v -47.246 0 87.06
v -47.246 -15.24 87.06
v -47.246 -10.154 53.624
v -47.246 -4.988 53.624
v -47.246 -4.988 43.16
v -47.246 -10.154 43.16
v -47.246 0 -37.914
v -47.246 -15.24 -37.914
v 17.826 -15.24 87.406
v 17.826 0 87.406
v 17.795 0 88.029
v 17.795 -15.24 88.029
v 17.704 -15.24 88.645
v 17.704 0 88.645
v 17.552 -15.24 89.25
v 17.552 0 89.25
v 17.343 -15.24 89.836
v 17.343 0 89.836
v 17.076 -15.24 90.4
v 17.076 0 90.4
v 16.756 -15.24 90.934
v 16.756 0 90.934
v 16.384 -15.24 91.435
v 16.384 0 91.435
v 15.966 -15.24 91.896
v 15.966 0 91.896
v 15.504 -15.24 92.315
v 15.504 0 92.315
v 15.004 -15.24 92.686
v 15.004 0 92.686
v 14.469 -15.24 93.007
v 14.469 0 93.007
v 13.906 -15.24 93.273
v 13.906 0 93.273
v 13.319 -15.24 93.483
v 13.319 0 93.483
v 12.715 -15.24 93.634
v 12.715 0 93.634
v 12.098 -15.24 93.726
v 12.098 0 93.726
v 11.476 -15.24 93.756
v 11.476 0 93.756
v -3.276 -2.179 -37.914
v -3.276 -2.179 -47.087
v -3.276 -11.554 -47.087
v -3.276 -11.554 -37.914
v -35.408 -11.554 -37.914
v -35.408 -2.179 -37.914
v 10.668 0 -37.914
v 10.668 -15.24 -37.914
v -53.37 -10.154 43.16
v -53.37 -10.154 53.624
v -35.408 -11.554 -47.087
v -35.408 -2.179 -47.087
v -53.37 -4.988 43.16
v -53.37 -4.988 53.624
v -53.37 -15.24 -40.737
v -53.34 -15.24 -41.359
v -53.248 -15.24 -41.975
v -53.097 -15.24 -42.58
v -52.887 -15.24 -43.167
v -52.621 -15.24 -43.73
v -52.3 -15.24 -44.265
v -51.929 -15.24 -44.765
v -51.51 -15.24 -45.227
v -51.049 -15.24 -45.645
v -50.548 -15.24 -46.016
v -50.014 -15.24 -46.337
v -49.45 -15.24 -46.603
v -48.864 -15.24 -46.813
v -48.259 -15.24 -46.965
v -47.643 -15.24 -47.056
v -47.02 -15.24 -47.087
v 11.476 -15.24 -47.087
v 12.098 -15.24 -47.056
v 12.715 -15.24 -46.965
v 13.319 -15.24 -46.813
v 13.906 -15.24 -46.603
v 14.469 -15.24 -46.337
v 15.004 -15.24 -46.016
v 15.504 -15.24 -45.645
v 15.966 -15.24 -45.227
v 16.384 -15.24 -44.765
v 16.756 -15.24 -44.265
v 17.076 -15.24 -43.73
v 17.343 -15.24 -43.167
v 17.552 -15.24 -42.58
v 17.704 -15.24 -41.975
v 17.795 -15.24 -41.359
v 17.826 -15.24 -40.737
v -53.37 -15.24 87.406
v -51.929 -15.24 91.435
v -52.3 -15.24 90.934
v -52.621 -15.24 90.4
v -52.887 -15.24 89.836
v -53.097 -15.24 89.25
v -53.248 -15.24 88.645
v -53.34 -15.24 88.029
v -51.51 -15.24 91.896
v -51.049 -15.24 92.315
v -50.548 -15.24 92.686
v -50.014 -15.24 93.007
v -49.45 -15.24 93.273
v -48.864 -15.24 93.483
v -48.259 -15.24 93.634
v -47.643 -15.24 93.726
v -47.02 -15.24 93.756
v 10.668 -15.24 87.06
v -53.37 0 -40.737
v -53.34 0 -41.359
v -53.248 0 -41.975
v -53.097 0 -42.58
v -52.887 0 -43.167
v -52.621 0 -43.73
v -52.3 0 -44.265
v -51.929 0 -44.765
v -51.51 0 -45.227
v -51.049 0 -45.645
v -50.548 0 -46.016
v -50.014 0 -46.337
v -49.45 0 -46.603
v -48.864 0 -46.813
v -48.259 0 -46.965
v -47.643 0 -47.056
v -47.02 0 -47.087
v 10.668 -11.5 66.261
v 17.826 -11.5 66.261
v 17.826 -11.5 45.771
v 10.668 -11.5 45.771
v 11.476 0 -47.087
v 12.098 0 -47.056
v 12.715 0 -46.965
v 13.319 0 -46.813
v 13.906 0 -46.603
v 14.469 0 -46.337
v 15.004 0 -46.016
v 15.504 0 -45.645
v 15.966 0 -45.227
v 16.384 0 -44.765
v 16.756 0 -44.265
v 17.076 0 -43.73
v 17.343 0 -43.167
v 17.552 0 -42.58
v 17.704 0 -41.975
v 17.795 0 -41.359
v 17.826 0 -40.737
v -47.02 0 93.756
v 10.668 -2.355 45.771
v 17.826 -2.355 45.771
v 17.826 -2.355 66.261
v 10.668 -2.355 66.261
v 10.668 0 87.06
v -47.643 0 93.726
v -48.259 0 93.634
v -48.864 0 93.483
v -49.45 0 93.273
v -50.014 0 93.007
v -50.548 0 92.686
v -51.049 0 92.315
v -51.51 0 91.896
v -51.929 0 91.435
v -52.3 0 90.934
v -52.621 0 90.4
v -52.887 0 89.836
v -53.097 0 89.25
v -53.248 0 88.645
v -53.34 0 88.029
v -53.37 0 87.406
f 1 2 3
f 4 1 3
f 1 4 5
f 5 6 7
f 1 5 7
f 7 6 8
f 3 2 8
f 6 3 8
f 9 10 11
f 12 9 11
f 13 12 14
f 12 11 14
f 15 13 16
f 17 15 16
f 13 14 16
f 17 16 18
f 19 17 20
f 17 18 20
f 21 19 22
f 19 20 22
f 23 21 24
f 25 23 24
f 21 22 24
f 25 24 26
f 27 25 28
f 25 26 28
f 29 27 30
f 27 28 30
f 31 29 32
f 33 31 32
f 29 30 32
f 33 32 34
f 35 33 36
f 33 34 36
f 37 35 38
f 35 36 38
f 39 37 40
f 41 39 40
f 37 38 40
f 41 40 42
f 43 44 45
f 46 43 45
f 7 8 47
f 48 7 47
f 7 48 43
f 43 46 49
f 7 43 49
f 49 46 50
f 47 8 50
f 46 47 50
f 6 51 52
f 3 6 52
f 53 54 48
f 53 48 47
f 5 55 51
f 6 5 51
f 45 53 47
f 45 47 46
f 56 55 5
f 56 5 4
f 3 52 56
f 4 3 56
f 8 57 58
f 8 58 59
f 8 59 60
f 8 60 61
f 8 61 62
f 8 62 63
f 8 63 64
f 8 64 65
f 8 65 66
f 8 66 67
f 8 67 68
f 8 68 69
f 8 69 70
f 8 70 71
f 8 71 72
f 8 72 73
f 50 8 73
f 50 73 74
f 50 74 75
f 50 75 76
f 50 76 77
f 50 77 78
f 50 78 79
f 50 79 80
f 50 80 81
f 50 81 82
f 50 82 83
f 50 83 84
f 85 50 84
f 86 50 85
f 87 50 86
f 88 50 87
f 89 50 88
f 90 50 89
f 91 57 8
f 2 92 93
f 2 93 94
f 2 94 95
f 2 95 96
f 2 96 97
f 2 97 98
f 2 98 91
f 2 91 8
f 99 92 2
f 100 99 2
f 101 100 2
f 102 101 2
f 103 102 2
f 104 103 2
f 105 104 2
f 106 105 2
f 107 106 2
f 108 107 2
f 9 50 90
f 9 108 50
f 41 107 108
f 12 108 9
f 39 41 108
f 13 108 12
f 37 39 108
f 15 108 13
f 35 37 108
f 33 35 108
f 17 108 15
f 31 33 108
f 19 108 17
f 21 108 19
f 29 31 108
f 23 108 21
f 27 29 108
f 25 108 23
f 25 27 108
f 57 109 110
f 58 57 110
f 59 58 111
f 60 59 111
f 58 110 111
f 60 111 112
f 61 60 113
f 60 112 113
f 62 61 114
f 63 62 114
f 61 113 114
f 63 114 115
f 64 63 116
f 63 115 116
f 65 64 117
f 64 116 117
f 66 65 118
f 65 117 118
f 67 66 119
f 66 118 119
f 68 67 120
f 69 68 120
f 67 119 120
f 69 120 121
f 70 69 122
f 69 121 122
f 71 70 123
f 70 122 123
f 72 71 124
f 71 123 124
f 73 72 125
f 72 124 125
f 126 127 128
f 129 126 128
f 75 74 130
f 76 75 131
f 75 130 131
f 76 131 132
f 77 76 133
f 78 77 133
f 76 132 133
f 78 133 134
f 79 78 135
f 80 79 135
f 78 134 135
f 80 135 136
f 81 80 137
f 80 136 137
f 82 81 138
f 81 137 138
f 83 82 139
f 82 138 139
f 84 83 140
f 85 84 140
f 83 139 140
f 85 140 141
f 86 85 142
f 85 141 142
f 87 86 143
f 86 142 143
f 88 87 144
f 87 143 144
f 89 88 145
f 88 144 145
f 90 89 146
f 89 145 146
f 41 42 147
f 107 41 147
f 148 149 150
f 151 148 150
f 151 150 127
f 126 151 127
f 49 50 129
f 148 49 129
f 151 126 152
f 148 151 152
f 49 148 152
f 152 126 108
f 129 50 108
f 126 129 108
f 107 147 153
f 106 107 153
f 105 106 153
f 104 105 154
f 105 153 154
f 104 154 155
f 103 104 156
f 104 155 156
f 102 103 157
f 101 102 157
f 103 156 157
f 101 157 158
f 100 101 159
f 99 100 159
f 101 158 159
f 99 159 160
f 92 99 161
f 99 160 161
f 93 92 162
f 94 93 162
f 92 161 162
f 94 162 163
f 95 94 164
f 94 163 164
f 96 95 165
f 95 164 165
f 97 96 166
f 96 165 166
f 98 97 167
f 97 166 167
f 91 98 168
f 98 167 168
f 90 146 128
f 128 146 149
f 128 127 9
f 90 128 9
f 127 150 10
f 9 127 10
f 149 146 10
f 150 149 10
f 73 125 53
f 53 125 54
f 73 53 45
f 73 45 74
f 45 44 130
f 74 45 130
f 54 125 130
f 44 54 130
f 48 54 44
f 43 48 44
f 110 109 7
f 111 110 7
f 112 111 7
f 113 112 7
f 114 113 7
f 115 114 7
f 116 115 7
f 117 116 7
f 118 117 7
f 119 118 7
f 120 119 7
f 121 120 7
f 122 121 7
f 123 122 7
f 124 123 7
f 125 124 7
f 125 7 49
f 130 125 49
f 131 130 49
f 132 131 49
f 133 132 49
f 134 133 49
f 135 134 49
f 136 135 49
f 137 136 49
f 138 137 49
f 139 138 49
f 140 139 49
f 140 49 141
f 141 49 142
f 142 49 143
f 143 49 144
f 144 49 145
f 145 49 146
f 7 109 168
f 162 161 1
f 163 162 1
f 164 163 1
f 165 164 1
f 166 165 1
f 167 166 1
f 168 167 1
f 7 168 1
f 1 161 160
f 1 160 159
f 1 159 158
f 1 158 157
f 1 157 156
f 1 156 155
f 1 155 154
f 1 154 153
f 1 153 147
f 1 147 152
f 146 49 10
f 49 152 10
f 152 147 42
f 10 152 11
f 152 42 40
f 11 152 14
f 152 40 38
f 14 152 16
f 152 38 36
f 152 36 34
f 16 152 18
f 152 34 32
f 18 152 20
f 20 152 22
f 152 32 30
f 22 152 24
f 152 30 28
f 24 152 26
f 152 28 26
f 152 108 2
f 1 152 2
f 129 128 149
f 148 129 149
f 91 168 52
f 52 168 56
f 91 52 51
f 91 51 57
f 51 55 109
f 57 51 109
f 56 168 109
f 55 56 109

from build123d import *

# Parameters (mm, degrees)
F1_DEPTH  = 15.24
F4_DEPTH  = 25.4
F5_W      = 2.5342174816
F5_H      = 10.4648
F5_W_2    = 2.6317641129
F6_DEPTH  = 25.4
F8_DEPTH  = 25.4
F9_W      = 32.1324085817
F9_H      = 9.3754695263
F10_DEPTH = 25.4


with BuildPart() as f1:
    # F0 (on Front) → F1 (new body)
    with BuildSketch(Plane.XZ):
        with BuildLine():
            ThreePointArc((-47.0203304827, 93.7563699834), (-51.5104585433, 91.896498044), (-53.3703304827, 87.4063699834))
            Line((-53.3703304827, 87.4063699834), (-53.3703304827, 75.7731699834))
            Line((-53.3703304827, 75.7731699834), (-53.3703304827, -40.7366300166))
            ThreePointArc((-53.3703304827, -40.7366300166), (-51.5104585433, -45.2267580771), (-47.0203304827, -47.0866300166))
            Line((-47.0203304827, -47.0866300166), (11.4758695173, -47.0866300166))
            ThreePointArc((11.4758695173, -47.0866300166), (15.9659975778, -45.2267580771), (17.8258695173, -40.7366300166))
            Line((17.8258695173, -40.7366300166), (17.8258695173, 87.4063699834))
            ThreePointArc((17.8258695173, 87.4063699834), (15.9659975778, 91.896498044), (11.4758695173, 93.7563699834))
            Line((11.4758695173, 93.7563699834), (-47.0203304827, 93.7563699834))
        make_face()
    extrude(amount=F1_DEPTH)

    # F3 (on face) → F4 (cut)
    with BuildSketch(Plane.XZ.offset(15.24)):
        Polygon((10.6684593484, 87.0597213507), (-47.2460240126, 87.0597213507), (10.6684593484, -37.9136353731), align=None)
        Polygon((10.6684593484, -37.9136353731), (-47.2460240126, 87.0597213507), (-47.2460240126, -35.696811974), align=None)
        Polygon((-47.2460240126, -37.9136353731), (10.6684593484, -37.9136353731), (-47.2460240126, -35.696811974), align=None)
    extrude(amount=-F4_DEPTH, mode=Mode.SUBTRACT)

    # F5 (on face) → F6 (cut)
    with BuildSketch(Plane(origin=(-53.3703304827, 0, 0), x_dir=(0, -1, 0), z_dir=(-1, 0, 0))):
        with Locations((8.8871087408, 48.3919699834)):
            Rectangle(F5_W, F5_H)
        with Locations((6.3041179436, 48.3919699834)):
            Rectangle(F5_W_2, F5_H)
    extrude(amount=-F6_DEPTH, mode=Mode.SUBTRACT)

    # F7 (on face) → F8 (cut)
    with BuildSketch(Plane.YZ.offset(17.8258695173)):
        Polygon((-2.3553799838, 66.2608699834), (-7.62, 66.2608699834), (-11.4997718483, 66.2608699834), (-11.4997718483, 45.7714051008), (-2.3553799838, 45.7714051008), align=None)
    extrude(amount=-F8_DEPTH, mode=Mode.SUBTRACT)

    # F9 (on face) → F10 (cut)
    with BuildSketch(Plane(origin=(0, 0, -47.0866300166), x_dir=(1, 0, 0), z_dir=(0, 0, -1))):
        with Locations((-19.3419498391, 6.8665045546)):
            Rectangle(F9_W, F9_H)
    extrude(amount=-F10_DEPTH, mode=Mode.SUBTRACT)


solid = f1.part
